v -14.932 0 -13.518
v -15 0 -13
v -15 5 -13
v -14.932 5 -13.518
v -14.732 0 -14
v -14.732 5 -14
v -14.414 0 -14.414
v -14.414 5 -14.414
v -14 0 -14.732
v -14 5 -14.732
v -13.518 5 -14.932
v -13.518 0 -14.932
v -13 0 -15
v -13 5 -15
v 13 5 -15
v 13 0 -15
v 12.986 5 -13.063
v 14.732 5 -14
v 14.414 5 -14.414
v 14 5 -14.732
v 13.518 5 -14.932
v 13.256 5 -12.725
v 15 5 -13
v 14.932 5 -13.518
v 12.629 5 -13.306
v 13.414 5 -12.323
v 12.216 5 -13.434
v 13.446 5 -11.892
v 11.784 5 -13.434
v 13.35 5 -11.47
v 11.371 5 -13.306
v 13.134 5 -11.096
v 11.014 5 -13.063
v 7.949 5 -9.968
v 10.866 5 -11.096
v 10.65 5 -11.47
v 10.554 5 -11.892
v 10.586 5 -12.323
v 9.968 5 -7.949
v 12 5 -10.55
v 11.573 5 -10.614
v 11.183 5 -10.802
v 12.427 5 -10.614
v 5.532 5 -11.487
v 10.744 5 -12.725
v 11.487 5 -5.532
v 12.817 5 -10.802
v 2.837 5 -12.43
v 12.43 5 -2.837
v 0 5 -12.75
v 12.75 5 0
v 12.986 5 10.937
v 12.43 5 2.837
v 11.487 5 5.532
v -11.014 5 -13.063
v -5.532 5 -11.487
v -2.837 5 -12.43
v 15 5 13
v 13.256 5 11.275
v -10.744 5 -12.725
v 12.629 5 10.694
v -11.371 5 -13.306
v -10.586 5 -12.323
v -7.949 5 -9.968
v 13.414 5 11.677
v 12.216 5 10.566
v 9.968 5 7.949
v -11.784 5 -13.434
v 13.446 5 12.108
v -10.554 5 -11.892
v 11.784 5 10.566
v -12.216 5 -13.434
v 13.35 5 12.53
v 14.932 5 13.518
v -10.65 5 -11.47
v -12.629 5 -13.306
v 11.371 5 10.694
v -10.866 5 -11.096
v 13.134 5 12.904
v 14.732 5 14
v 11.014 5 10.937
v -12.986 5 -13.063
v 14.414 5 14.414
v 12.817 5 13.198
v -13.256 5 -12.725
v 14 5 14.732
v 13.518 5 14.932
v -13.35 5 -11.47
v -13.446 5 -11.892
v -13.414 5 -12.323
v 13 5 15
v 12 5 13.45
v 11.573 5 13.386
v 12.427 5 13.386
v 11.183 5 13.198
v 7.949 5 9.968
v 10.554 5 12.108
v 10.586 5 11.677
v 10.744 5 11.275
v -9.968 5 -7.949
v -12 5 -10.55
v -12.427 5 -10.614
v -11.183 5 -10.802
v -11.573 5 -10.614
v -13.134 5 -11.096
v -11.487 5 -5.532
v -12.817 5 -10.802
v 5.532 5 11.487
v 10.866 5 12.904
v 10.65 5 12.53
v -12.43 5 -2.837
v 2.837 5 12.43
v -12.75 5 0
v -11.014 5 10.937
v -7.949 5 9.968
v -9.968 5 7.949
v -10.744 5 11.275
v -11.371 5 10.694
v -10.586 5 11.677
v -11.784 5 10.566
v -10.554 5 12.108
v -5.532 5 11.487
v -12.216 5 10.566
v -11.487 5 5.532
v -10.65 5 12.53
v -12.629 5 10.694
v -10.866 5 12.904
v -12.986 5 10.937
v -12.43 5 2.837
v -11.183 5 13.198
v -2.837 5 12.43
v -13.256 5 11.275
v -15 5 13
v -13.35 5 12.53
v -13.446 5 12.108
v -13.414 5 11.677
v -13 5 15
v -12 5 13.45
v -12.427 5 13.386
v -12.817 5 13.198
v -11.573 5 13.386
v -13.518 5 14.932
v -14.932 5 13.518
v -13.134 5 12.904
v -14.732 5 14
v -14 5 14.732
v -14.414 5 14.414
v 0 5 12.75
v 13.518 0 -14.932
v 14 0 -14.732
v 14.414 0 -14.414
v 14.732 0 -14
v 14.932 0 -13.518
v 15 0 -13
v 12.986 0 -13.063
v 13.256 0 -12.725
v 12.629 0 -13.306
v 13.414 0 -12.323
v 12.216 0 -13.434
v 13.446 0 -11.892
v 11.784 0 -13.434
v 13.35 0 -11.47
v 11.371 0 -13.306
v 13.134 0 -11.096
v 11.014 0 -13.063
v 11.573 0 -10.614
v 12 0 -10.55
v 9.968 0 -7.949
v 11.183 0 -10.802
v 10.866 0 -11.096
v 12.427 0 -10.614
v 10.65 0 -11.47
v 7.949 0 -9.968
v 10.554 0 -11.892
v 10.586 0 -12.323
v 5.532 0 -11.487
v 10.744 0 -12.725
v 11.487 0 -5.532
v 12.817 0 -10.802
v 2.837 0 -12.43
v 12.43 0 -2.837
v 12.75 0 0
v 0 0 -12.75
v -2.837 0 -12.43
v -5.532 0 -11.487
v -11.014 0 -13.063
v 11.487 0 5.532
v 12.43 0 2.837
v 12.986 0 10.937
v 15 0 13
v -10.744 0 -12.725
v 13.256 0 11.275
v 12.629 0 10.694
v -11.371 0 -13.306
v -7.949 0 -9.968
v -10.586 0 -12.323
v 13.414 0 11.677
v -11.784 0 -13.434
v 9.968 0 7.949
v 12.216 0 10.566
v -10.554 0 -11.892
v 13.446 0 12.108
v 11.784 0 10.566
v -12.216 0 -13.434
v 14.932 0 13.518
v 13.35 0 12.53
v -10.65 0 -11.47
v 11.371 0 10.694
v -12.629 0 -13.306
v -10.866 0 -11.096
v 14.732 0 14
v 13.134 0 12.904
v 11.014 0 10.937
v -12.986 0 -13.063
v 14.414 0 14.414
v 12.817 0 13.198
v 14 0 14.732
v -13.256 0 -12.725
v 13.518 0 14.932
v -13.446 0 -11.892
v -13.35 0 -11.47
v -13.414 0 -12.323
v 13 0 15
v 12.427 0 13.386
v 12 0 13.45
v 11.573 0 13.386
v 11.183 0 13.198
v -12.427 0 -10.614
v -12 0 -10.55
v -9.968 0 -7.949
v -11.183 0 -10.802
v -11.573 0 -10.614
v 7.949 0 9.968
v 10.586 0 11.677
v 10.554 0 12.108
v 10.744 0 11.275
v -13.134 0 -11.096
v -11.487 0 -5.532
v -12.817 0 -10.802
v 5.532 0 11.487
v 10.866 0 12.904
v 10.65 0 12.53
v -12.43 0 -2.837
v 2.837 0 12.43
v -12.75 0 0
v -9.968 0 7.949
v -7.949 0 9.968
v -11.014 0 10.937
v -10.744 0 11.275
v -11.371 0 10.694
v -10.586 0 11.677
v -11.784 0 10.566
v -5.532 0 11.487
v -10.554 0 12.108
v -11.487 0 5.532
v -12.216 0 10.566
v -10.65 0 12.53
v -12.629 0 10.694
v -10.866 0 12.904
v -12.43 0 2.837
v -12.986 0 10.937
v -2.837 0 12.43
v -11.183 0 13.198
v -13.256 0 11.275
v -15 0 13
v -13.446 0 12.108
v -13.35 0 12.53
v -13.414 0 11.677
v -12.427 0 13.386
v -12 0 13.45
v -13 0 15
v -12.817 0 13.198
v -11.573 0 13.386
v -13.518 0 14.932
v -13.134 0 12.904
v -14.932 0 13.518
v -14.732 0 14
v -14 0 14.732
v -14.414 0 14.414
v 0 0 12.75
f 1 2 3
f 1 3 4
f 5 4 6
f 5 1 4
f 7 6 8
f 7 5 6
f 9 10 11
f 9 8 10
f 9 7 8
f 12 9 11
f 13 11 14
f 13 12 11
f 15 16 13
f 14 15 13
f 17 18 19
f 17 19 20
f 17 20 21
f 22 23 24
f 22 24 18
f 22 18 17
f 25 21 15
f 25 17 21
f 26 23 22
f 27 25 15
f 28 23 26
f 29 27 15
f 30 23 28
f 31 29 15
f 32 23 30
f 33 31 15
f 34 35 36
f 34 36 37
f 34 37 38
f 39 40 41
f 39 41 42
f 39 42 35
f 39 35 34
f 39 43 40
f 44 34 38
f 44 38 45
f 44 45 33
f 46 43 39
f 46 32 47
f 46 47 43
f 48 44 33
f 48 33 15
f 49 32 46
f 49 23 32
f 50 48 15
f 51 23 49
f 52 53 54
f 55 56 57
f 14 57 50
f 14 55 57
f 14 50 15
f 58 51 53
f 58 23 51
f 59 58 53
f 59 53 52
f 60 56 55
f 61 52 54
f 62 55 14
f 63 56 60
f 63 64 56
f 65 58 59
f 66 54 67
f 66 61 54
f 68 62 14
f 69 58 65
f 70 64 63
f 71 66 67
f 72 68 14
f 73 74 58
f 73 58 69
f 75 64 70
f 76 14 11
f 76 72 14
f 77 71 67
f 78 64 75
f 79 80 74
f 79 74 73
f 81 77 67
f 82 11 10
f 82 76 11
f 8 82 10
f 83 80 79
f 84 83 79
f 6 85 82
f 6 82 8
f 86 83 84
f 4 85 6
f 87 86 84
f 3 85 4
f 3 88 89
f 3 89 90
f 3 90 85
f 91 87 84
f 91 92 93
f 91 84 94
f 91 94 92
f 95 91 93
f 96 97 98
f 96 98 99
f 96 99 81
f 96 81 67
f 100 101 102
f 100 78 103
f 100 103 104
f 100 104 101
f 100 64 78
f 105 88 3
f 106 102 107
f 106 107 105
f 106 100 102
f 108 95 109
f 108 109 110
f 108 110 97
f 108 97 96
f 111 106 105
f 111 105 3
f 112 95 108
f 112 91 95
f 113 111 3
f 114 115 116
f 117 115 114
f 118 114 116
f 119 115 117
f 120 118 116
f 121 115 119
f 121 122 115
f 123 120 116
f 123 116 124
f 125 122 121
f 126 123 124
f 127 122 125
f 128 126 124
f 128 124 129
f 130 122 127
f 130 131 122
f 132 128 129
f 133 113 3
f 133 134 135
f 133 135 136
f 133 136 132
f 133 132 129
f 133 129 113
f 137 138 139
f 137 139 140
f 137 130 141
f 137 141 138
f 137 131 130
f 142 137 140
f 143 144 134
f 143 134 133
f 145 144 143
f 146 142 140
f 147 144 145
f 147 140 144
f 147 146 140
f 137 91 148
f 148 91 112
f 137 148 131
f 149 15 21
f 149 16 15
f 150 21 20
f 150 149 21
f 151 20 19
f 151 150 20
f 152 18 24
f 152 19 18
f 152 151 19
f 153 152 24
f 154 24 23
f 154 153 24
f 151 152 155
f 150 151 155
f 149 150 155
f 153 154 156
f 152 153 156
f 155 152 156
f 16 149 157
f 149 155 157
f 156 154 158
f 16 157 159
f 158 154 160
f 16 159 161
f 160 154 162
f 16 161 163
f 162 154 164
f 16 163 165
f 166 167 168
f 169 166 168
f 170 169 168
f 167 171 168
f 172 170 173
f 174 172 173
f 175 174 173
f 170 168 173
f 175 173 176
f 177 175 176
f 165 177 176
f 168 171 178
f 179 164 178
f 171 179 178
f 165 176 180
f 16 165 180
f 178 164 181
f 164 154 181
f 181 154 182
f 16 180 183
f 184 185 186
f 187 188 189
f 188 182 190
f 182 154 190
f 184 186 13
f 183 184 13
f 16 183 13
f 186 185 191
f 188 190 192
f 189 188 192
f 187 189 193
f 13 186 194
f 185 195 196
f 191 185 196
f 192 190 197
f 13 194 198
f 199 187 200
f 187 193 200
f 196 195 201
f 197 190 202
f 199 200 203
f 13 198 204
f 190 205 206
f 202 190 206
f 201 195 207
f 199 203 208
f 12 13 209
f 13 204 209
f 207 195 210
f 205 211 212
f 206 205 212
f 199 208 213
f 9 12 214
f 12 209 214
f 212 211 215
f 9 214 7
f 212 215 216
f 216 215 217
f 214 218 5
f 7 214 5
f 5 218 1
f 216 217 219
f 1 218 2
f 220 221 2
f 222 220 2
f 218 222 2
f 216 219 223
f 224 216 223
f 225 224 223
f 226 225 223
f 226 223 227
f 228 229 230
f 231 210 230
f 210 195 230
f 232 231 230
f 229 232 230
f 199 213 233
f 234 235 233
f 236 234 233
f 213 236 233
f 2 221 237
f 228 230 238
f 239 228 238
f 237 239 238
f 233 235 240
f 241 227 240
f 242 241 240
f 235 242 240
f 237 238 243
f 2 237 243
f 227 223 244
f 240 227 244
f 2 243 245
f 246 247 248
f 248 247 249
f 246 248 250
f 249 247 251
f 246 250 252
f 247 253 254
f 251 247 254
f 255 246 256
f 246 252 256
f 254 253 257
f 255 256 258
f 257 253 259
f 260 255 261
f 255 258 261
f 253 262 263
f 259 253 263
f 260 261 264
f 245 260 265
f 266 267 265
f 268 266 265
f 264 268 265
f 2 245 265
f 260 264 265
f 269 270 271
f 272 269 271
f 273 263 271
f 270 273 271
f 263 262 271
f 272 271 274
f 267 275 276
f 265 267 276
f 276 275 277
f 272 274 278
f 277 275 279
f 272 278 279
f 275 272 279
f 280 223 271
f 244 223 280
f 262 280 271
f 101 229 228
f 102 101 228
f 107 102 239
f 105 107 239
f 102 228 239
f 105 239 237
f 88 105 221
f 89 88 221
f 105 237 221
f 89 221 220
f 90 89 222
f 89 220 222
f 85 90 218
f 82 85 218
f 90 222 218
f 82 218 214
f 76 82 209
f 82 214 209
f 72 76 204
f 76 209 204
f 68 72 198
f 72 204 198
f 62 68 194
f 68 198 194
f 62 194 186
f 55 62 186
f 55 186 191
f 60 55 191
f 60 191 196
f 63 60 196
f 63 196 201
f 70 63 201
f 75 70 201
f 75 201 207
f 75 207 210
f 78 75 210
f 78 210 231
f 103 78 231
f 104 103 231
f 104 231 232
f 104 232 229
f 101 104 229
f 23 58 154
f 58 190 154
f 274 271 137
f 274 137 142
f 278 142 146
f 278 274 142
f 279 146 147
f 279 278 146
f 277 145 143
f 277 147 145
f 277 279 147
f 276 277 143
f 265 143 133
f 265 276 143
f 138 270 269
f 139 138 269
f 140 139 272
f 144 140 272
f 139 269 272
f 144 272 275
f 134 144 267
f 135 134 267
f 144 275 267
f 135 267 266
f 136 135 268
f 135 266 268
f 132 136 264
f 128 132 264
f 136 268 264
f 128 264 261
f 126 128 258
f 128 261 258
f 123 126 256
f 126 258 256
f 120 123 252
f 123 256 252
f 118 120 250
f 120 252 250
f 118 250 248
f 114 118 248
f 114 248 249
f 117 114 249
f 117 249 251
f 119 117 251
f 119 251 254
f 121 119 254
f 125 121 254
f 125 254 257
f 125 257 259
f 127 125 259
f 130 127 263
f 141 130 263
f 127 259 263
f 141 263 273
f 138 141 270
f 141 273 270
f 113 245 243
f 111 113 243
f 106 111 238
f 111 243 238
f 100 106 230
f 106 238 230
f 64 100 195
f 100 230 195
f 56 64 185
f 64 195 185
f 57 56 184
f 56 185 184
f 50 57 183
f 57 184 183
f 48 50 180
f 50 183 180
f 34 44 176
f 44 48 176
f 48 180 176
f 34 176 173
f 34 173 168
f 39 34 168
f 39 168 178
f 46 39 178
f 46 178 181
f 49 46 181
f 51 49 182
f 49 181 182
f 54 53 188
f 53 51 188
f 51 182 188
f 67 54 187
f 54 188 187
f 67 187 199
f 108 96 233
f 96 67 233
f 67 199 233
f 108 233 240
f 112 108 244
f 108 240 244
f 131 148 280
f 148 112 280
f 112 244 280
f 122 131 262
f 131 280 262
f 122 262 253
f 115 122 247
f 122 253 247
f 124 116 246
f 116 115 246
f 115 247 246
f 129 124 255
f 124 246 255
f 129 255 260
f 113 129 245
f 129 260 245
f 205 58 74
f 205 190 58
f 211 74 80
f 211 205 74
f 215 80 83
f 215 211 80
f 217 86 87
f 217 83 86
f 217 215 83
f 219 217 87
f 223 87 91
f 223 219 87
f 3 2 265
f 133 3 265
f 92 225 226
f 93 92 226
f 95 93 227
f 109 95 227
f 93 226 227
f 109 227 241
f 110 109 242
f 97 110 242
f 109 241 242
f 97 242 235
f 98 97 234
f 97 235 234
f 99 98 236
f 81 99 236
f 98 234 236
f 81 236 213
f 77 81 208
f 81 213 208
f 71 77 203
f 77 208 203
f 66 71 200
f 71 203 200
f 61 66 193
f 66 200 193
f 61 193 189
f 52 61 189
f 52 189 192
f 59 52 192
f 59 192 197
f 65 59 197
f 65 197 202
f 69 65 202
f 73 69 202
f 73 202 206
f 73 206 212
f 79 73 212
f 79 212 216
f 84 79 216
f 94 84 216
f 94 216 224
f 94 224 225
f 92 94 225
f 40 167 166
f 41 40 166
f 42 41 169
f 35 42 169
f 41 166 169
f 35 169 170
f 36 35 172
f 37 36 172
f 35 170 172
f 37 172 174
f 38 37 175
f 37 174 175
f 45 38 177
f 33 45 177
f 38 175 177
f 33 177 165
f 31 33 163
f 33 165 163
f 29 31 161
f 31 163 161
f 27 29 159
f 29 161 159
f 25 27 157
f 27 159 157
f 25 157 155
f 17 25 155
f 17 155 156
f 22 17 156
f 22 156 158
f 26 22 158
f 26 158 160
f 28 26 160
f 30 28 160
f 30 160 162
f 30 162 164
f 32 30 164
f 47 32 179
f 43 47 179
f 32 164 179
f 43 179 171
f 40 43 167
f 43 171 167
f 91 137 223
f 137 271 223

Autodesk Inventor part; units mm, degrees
ref_plane "YZ Plane" through (0, 0, 0) normal (1, 0, 0) x (0, 1, 0)
ref_plane "XZ Plane" through (0, 0, 0) normal (0, 1, 0) x (-1, 0, 0)
ref_plane "XY Plane" through (0, 0, 0) normal (0, 0, 1) x (1, 0, 0)
sketch "Sketch1" plane through (0, 0, 0) normal (0, 1, 0) x (-1, 0, 0)
  circle A0 centre (0, 0) radius 12.75
  line L0 (13, 15) -> (-13, 15)
  line L1 (-15, 13) -> (-15, -13)
  line L2 (-13, -15) -> (13, -15)
  line L3 (15, -13) -> (15, 13)
  line L4 (15, 15) -> (-15, -15) construction
  line L5 (-15, 15) -> (15, -15) construction
  arc A1 (15, 13) -> (13, 15) centre (13, 13) ccw
  arc A2 (13, -15) -> (15, -13) centre (13, -13) ccw
  arc A3 (-15, -13) -> (-13, -15) centre (-13, -13) ccw
  arc A4 (-13, 15) -> (-15, 13) centre (-13, 13) ccw
  dimension "d0" = 25.5
  dimension "d1" = 30
  dimension "d2" = 30
  dimension "d3" = 2
extrude "Extrusion1" add sketch "Sketch1" along normal blind 5
sketch "Sketch2" plane through (0, 5, 0) normal (0, 1, 0) x (1, 0, 0)
  circle A0 centre (0, 0) radius 12.75 projected
  line L0 (-13, -15) -> (13, -15) projected
  arc A1 (13, -15) -> (15, -13) centre (13, -13) ccw projected
  line L1 (15, -13) -> (15, 13) projected
  arc A2 (15, 13) -> (13, 15) centre (13, 13) ccw projected
  line L2 (13, 15) -> (-13, 15) projected
  arc A3 (-13, 15) -> (-15, 13) centre (-13, 13) ccw projected
  line L3 (-15, 13) -> (-15, -13) projected
  arc A4 (-15, -13) -> (-13, -15) centre (-13, -13) ccw projected
  line L4 (12, 12) -> (-12, 12)
  line L5 (-12, 12) -> (-12, -12)
  line L6 (-12, -12) -> (12, -12)
  line L7 (12, -12) -> (12, 12)
  line L8 (12, 12) -> (-12, -12) construction
  line L9 (-12, 12) -> (12, -12) construction
  dimension "d6" = 24
  dimension "d7" = 24
  dimension "d15" = 30
hole "Hole1" at (-12, 5, -12) at (12, 5, -12) at (12, 5, 12) at (-12, 5, 12) direction (0, -1, 0) diameter 2.9 depth 24 tip angle 118
properties part number "100_Adapter_Waveplate"
